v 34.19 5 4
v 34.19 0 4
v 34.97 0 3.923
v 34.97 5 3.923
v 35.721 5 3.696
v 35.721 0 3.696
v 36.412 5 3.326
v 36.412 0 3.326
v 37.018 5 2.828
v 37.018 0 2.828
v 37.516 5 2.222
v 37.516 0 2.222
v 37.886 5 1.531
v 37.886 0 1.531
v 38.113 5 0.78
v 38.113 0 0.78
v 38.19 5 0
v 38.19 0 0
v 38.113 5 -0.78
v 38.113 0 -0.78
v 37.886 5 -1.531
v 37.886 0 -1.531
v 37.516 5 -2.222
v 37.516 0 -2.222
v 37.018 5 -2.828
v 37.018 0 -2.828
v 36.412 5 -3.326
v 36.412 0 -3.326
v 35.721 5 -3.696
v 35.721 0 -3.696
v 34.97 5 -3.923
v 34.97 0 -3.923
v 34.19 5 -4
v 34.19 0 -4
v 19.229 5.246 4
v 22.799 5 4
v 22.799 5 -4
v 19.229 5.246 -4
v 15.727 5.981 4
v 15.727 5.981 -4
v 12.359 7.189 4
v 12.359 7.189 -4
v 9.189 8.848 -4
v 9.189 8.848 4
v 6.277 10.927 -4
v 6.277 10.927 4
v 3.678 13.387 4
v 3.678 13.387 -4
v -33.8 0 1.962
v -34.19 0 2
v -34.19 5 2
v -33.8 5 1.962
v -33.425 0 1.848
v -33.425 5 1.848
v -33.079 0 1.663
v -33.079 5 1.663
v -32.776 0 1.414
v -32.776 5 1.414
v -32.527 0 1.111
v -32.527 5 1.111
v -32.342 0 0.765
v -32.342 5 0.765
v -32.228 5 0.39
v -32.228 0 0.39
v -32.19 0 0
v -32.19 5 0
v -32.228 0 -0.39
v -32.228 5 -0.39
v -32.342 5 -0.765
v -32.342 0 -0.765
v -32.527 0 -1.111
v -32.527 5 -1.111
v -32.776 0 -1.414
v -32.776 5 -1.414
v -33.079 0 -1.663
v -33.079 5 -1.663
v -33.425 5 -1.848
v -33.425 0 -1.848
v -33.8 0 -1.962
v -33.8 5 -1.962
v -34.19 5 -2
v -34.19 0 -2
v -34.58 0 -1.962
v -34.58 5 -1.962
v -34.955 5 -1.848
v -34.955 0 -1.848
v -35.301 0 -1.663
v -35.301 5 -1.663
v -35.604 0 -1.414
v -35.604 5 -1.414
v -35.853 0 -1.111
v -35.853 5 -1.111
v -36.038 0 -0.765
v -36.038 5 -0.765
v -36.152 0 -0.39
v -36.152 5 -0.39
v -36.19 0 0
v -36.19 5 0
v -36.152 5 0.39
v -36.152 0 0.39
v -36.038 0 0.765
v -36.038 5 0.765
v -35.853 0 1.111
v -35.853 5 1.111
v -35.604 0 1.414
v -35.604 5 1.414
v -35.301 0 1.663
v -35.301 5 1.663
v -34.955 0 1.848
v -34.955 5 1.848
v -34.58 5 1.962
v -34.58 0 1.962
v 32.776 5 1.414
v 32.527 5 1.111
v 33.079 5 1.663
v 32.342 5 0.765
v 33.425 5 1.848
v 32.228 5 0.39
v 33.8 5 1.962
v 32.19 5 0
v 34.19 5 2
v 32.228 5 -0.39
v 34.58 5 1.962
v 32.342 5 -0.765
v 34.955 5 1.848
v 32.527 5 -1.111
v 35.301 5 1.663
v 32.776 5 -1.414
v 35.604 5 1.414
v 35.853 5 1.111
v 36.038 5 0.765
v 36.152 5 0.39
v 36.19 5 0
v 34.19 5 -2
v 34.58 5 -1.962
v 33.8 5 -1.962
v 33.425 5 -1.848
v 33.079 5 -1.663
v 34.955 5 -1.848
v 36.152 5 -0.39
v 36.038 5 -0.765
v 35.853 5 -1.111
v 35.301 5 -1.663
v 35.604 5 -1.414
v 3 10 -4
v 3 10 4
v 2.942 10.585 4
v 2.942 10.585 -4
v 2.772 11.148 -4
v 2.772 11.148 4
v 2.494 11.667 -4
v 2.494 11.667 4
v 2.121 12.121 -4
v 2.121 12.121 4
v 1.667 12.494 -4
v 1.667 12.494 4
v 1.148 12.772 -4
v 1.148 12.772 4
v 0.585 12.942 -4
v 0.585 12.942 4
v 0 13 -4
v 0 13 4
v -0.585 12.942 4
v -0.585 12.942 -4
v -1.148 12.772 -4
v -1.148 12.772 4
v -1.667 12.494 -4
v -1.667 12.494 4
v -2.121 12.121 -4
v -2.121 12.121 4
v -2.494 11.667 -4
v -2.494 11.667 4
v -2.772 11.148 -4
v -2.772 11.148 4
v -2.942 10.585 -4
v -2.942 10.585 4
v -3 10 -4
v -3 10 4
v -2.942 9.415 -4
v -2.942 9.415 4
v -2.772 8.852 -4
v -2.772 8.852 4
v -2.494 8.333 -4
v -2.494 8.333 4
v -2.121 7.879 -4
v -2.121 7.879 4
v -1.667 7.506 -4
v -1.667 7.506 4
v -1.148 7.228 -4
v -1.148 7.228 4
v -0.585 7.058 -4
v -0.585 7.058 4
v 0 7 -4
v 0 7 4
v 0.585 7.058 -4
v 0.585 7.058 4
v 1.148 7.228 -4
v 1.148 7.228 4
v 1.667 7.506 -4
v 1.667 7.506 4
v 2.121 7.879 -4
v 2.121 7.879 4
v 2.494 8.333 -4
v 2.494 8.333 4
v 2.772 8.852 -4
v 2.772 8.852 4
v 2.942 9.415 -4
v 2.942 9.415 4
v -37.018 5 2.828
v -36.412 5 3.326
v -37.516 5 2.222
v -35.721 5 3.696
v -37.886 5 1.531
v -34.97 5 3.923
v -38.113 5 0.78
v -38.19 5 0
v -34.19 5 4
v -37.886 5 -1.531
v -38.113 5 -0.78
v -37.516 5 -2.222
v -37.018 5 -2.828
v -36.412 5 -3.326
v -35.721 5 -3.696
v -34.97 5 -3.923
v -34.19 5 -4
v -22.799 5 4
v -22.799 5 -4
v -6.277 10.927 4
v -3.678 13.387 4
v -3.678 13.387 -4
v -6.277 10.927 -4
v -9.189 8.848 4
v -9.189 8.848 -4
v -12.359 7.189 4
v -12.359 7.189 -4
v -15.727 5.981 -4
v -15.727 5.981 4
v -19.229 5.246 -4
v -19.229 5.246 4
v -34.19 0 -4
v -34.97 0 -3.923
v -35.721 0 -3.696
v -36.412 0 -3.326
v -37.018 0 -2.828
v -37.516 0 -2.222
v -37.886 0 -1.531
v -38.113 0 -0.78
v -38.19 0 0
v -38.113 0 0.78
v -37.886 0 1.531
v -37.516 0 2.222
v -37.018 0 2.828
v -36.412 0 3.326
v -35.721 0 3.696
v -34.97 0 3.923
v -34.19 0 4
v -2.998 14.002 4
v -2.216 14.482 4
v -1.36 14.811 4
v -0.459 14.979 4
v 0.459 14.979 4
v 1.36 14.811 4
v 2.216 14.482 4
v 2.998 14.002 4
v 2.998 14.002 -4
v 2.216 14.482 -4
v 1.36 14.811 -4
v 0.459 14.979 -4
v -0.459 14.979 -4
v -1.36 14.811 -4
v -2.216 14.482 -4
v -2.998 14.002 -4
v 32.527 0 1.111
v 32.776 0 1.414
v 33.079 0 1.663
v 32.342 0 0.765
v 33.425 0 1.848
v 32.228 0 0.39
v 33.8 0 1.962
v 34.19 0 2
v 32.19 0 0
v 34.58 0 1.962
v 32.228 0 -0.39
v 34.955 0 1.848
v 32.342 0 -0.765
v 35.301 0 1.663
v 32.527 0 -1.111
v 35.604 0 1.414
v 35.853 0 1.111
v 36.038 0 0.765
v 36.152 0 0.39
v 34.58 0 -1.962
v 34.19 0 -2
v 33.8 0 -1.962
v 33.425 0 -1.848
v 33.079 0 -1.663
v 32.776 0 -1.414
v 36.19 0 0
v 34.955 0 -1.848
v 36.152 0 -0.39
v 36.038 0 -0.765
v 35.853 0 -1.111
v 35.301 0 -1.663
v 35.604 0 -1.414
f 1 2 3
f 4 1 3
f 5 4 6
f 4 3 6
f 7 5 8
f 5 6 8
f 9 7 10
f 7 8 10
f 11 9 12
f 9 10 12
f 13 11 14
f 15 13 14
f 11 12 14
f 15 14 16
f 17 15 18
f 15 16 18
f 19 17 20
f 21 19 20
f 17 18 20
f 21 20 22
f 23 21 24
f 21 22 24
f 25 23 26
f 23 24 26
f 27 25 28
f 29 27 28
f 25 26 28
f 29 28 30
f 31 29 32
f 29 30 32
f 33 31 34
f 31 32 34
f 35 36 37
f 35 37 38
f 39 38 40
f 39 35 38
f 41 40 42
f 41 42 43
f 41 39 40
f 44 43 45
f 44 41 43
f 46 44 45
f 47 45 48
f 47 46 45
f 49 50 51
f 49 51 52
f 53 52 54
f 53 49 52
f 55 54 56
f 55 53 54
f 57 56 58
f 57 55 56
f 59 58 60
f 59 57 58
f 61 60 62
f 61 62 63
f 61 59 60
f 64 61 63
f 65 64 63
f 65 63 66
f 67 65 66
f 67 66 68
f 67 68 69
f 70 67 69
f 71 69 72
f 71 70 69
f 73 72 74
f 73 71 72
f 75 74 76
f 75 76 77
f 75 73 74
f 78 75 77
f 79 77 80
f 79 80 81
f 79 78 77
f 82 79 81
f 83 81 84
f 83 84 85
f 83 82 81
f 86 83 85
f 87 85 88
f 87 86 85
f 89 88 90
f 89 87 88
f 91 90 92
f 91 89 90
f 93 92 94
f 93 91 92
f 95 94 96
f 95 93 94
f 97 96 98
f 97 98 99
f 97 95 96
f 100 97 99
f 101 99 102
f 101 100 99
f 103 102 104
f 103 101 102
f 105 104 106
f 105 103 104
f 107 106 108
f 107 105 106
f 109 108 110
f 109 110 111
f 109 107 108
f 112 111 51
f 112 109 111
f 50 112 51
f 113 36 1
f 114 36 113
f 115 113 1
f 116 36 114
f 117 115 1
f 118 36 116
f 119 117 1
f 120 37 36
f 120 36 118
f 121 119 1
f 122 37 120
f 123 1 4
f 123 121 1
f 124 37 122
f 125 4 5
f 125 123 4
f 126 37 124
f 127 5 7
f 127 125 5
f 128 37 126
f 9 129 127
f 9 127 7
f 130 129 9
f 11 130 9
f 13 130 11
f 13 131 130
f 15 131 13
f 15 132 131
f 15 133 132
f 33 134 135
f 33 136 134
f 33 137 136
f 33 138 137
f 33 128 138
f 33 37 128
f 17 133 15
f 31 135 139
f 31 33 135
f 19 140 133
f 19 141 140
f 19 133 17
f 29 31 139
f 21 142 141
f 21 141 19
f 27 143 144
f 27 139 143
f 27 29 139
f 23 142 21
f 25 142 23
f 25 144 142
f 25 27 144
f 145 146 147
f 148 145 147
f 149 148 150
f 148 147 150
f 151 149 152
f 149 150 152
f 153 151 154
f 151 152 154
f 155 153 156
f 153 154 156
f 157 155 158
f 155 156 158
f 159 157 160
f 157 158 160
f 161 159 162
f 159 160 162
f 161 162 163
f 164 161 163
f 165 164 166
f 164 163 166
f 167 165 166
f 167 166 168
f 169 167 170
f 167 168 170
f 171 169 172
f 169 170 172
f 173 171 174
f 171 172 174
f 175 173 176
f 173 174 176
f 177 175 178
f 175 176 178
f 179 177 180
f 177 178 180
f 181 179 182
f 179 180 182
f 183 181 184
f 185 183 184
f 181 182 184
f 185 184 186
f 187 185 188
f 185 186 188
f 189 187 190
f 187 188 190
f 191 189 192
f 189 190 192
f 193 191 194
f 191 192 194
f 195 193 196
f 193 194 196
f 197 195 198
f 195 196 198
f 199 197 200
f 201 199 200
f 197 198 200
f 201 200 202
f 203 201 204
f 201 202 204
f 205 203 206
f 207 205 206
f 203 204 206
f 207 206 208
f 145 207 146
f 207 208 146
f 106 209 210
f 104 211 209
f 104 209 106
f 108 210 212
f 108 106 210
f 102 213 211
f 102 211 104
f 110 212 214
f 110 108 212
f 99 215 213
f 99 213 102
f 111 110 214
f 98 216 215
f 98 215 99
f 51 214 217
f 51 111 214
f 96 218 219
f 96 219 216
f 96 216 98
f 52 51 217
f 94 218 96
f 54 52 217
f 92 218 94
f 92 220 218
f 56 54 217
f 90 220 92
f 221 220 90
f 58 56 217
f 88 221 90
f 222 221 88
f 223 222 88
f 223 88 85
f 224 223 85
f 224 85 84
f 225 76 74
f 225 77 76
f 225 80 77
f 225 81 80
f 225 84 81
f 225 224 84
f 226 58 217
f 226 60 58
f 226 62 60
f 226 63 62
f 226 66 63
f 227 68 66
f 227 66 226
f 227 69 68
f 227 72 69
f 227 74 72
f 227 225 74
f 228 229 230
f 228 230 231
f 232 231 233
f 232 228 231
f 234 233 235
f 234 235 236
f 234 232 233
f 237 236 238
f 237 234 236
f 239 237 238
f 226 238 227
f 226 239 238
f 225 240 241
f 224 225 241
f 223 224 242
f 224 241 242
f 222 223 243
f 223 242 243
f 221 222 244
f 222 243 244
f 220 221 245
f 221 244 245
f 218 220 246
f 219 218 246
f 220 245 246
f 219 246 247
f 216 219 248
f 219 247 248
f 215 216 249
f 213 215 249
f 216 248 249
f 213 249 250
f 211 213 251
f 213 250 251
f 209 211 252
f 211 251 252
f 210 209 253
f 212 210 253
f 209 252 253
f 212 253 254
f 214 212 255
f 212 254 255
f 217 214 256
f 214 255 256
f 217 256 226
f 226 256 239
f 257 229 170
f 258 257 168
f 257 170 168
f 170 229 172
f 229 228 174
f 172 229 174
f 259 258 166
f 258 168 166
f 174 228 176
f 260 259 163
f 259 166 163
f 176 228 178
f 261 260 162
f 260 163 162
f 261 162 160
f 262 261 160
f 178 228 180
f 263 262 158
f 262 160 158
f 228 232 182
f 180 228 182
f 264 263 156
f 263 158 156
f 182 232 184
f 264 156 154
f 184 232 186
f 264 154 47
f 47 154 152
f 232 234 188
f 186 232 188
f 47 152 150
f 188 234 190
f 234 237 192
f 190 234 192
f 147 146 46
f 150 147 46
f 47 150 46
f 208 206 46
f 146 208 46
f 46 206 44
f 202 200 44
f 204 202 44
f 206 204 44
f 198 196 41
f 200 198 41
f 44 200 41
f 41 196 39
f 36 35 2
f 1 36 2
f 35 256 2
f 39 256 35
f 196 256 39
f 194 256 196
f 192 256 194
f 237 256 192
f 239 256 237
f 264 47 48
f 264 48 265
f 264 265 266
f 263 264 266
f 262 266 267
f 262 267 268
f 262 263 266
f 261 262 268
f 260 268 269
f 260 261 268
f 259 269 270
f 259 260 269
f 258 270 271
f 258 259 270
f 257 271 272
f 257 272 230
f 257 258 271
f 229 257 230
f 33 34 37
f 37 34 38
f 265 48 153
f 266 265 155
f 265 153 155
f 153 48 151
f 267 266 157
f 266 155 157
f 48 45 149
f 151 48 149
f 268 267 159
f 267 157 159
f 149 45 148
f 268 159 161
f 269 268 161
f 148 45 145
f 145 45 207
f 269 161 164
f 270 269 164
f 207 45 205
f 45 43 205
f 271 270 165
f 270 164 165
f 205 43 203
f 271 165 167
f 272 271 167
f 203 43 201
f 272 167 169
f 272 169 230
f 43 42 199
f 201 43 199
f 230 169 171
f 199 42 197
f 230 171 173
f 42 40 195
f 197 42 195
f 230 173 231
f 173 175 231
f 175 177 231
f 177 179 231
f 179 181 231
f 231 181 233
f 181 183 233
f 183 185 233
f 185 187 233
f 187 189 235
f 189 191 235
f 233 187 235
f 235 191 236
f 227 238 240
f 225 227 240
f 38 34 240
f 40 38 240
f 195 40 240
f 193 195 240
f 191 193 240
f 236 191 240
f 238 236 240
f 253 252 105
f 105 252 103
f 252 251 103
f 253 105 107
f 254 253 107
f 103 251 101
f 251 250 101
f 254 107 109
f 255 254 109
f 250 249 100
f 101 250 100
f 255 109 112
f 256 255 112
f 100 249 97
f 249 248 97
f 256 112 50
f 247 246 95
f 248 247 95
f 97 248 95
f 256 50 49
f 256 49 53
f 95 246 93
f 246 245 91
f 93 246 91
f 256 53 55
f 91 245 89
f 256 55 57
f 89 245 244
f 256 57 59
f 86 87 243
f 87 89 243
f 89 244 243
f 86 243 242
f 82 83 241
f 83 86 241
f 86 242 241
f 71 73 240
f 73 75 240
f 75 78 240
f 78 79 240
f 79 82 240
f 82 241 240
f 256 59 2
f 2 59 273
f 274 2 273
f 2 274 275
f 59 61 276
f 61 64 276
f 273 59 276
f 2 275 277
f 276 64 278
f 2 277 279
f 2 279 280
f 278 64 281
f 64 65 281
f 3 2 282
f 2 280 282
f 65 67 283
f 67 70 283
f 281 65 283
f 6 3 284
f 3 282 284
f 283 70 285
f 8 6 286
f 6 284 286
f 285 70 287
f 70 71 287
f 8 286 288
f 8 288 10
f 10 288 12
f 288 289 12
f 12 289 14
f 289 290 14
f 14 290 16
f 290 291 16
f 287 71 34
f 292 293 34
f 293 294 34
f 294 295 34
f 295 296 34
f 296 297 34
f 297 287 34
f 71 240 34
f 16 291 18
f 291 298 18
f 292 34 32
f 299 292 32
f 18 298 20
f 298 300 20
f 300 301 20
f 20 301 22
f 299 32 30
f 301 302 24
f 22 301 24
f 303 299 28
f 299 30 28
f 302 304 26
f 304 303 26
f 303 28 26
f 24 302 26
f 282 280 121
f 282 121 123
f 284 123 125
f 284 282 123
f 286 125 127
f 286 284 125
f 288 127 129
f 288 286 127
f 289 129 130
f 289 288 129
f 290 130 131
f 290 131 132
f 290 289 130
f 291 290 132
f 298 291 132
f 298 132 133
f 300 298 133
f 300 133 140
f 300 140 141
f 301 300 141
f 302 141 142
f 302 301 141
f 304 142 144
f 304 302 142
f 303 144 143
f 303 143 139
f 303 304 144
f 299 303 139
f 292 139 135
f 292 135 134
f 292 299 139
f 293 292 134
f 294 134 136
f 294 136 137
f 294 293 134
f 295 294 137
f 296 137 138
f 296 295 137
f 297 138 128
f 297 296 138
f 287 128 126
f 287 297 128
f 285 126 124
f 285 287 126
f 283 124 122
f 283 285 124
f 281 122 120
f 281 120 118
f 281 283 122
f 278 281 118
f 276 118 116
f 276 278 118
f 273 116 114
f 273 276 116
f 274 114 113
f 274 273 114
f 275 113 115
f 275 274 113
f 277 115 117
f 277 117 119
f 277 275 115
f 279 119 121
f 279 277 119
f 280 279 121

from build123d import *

# Parameters (mm, degrees)
SKETCH1_R           = 2
BOSS_EXTRUDE1_DEPTH = 5
SKETCH2_R           = 3
BOSS_EXTRUDE2_DEPTH = 8


with BuildPart() as part:
    # Sketch1 → Boss-Extrude1 (new body)
    with BuildSketch(Plane(origin=(0, 0, 0), x_dir=(1, 0, 0), z_dir=(0, 1, 0))):
        with BuildLine():
            Line((-34.19, -4), (34.19, -4))
            ThreePointArc((34.19, -4), (38.19, 0), (34.19, 4))
            Line((34.19, 4), (-34.19, 4))
            ThreePointArc((-34.19, 4), (-38.19, 0), (-34.19, -4))
        make_face()
        with Locations(Location((34.19, 0, 0), (0, 0, 270))):
            Circle(SKETCH1_R, mode=Mode.SUBTRACT)
        with Locations(Location((-34.19, 0, 0), (0, 0, 270))):
            Circle(SKETCH1_R, mode=Mode.SUBTRACT)
    extrude(amount=BOSS_EXTRUDE1_DEPTH)

    # Sketch2 → Boss-Extrude2 (add)
    with BuildSketch(Plane.XY.offset(4)):
        with BuildLine():
            ThreePointArc((-3.678488933, 13.386549744), (-12.35949887, 7.188806921), (-22.798898944, 5))
            Line((-22.798898944, 5), (6e-09, 5))
            Line((6e-09, 5), (22.798898944, 5))
            ThreePointArc((22.798898944, 5), (12.35949887, 7.188806921), (3.678488933, 13.386549744))
            ThreePointArc((3.678488933, 13.386549744), (0, 15), (-3.678488933, 13.386549744))
        make_face()
        with Locations((0, 10)):
            Circle(SKETCH2_R, mode=Mode.SUBTRACT)
    extrude(amount=-BOSS_EXTRUDE2_DEPTH)


solid = part.part
